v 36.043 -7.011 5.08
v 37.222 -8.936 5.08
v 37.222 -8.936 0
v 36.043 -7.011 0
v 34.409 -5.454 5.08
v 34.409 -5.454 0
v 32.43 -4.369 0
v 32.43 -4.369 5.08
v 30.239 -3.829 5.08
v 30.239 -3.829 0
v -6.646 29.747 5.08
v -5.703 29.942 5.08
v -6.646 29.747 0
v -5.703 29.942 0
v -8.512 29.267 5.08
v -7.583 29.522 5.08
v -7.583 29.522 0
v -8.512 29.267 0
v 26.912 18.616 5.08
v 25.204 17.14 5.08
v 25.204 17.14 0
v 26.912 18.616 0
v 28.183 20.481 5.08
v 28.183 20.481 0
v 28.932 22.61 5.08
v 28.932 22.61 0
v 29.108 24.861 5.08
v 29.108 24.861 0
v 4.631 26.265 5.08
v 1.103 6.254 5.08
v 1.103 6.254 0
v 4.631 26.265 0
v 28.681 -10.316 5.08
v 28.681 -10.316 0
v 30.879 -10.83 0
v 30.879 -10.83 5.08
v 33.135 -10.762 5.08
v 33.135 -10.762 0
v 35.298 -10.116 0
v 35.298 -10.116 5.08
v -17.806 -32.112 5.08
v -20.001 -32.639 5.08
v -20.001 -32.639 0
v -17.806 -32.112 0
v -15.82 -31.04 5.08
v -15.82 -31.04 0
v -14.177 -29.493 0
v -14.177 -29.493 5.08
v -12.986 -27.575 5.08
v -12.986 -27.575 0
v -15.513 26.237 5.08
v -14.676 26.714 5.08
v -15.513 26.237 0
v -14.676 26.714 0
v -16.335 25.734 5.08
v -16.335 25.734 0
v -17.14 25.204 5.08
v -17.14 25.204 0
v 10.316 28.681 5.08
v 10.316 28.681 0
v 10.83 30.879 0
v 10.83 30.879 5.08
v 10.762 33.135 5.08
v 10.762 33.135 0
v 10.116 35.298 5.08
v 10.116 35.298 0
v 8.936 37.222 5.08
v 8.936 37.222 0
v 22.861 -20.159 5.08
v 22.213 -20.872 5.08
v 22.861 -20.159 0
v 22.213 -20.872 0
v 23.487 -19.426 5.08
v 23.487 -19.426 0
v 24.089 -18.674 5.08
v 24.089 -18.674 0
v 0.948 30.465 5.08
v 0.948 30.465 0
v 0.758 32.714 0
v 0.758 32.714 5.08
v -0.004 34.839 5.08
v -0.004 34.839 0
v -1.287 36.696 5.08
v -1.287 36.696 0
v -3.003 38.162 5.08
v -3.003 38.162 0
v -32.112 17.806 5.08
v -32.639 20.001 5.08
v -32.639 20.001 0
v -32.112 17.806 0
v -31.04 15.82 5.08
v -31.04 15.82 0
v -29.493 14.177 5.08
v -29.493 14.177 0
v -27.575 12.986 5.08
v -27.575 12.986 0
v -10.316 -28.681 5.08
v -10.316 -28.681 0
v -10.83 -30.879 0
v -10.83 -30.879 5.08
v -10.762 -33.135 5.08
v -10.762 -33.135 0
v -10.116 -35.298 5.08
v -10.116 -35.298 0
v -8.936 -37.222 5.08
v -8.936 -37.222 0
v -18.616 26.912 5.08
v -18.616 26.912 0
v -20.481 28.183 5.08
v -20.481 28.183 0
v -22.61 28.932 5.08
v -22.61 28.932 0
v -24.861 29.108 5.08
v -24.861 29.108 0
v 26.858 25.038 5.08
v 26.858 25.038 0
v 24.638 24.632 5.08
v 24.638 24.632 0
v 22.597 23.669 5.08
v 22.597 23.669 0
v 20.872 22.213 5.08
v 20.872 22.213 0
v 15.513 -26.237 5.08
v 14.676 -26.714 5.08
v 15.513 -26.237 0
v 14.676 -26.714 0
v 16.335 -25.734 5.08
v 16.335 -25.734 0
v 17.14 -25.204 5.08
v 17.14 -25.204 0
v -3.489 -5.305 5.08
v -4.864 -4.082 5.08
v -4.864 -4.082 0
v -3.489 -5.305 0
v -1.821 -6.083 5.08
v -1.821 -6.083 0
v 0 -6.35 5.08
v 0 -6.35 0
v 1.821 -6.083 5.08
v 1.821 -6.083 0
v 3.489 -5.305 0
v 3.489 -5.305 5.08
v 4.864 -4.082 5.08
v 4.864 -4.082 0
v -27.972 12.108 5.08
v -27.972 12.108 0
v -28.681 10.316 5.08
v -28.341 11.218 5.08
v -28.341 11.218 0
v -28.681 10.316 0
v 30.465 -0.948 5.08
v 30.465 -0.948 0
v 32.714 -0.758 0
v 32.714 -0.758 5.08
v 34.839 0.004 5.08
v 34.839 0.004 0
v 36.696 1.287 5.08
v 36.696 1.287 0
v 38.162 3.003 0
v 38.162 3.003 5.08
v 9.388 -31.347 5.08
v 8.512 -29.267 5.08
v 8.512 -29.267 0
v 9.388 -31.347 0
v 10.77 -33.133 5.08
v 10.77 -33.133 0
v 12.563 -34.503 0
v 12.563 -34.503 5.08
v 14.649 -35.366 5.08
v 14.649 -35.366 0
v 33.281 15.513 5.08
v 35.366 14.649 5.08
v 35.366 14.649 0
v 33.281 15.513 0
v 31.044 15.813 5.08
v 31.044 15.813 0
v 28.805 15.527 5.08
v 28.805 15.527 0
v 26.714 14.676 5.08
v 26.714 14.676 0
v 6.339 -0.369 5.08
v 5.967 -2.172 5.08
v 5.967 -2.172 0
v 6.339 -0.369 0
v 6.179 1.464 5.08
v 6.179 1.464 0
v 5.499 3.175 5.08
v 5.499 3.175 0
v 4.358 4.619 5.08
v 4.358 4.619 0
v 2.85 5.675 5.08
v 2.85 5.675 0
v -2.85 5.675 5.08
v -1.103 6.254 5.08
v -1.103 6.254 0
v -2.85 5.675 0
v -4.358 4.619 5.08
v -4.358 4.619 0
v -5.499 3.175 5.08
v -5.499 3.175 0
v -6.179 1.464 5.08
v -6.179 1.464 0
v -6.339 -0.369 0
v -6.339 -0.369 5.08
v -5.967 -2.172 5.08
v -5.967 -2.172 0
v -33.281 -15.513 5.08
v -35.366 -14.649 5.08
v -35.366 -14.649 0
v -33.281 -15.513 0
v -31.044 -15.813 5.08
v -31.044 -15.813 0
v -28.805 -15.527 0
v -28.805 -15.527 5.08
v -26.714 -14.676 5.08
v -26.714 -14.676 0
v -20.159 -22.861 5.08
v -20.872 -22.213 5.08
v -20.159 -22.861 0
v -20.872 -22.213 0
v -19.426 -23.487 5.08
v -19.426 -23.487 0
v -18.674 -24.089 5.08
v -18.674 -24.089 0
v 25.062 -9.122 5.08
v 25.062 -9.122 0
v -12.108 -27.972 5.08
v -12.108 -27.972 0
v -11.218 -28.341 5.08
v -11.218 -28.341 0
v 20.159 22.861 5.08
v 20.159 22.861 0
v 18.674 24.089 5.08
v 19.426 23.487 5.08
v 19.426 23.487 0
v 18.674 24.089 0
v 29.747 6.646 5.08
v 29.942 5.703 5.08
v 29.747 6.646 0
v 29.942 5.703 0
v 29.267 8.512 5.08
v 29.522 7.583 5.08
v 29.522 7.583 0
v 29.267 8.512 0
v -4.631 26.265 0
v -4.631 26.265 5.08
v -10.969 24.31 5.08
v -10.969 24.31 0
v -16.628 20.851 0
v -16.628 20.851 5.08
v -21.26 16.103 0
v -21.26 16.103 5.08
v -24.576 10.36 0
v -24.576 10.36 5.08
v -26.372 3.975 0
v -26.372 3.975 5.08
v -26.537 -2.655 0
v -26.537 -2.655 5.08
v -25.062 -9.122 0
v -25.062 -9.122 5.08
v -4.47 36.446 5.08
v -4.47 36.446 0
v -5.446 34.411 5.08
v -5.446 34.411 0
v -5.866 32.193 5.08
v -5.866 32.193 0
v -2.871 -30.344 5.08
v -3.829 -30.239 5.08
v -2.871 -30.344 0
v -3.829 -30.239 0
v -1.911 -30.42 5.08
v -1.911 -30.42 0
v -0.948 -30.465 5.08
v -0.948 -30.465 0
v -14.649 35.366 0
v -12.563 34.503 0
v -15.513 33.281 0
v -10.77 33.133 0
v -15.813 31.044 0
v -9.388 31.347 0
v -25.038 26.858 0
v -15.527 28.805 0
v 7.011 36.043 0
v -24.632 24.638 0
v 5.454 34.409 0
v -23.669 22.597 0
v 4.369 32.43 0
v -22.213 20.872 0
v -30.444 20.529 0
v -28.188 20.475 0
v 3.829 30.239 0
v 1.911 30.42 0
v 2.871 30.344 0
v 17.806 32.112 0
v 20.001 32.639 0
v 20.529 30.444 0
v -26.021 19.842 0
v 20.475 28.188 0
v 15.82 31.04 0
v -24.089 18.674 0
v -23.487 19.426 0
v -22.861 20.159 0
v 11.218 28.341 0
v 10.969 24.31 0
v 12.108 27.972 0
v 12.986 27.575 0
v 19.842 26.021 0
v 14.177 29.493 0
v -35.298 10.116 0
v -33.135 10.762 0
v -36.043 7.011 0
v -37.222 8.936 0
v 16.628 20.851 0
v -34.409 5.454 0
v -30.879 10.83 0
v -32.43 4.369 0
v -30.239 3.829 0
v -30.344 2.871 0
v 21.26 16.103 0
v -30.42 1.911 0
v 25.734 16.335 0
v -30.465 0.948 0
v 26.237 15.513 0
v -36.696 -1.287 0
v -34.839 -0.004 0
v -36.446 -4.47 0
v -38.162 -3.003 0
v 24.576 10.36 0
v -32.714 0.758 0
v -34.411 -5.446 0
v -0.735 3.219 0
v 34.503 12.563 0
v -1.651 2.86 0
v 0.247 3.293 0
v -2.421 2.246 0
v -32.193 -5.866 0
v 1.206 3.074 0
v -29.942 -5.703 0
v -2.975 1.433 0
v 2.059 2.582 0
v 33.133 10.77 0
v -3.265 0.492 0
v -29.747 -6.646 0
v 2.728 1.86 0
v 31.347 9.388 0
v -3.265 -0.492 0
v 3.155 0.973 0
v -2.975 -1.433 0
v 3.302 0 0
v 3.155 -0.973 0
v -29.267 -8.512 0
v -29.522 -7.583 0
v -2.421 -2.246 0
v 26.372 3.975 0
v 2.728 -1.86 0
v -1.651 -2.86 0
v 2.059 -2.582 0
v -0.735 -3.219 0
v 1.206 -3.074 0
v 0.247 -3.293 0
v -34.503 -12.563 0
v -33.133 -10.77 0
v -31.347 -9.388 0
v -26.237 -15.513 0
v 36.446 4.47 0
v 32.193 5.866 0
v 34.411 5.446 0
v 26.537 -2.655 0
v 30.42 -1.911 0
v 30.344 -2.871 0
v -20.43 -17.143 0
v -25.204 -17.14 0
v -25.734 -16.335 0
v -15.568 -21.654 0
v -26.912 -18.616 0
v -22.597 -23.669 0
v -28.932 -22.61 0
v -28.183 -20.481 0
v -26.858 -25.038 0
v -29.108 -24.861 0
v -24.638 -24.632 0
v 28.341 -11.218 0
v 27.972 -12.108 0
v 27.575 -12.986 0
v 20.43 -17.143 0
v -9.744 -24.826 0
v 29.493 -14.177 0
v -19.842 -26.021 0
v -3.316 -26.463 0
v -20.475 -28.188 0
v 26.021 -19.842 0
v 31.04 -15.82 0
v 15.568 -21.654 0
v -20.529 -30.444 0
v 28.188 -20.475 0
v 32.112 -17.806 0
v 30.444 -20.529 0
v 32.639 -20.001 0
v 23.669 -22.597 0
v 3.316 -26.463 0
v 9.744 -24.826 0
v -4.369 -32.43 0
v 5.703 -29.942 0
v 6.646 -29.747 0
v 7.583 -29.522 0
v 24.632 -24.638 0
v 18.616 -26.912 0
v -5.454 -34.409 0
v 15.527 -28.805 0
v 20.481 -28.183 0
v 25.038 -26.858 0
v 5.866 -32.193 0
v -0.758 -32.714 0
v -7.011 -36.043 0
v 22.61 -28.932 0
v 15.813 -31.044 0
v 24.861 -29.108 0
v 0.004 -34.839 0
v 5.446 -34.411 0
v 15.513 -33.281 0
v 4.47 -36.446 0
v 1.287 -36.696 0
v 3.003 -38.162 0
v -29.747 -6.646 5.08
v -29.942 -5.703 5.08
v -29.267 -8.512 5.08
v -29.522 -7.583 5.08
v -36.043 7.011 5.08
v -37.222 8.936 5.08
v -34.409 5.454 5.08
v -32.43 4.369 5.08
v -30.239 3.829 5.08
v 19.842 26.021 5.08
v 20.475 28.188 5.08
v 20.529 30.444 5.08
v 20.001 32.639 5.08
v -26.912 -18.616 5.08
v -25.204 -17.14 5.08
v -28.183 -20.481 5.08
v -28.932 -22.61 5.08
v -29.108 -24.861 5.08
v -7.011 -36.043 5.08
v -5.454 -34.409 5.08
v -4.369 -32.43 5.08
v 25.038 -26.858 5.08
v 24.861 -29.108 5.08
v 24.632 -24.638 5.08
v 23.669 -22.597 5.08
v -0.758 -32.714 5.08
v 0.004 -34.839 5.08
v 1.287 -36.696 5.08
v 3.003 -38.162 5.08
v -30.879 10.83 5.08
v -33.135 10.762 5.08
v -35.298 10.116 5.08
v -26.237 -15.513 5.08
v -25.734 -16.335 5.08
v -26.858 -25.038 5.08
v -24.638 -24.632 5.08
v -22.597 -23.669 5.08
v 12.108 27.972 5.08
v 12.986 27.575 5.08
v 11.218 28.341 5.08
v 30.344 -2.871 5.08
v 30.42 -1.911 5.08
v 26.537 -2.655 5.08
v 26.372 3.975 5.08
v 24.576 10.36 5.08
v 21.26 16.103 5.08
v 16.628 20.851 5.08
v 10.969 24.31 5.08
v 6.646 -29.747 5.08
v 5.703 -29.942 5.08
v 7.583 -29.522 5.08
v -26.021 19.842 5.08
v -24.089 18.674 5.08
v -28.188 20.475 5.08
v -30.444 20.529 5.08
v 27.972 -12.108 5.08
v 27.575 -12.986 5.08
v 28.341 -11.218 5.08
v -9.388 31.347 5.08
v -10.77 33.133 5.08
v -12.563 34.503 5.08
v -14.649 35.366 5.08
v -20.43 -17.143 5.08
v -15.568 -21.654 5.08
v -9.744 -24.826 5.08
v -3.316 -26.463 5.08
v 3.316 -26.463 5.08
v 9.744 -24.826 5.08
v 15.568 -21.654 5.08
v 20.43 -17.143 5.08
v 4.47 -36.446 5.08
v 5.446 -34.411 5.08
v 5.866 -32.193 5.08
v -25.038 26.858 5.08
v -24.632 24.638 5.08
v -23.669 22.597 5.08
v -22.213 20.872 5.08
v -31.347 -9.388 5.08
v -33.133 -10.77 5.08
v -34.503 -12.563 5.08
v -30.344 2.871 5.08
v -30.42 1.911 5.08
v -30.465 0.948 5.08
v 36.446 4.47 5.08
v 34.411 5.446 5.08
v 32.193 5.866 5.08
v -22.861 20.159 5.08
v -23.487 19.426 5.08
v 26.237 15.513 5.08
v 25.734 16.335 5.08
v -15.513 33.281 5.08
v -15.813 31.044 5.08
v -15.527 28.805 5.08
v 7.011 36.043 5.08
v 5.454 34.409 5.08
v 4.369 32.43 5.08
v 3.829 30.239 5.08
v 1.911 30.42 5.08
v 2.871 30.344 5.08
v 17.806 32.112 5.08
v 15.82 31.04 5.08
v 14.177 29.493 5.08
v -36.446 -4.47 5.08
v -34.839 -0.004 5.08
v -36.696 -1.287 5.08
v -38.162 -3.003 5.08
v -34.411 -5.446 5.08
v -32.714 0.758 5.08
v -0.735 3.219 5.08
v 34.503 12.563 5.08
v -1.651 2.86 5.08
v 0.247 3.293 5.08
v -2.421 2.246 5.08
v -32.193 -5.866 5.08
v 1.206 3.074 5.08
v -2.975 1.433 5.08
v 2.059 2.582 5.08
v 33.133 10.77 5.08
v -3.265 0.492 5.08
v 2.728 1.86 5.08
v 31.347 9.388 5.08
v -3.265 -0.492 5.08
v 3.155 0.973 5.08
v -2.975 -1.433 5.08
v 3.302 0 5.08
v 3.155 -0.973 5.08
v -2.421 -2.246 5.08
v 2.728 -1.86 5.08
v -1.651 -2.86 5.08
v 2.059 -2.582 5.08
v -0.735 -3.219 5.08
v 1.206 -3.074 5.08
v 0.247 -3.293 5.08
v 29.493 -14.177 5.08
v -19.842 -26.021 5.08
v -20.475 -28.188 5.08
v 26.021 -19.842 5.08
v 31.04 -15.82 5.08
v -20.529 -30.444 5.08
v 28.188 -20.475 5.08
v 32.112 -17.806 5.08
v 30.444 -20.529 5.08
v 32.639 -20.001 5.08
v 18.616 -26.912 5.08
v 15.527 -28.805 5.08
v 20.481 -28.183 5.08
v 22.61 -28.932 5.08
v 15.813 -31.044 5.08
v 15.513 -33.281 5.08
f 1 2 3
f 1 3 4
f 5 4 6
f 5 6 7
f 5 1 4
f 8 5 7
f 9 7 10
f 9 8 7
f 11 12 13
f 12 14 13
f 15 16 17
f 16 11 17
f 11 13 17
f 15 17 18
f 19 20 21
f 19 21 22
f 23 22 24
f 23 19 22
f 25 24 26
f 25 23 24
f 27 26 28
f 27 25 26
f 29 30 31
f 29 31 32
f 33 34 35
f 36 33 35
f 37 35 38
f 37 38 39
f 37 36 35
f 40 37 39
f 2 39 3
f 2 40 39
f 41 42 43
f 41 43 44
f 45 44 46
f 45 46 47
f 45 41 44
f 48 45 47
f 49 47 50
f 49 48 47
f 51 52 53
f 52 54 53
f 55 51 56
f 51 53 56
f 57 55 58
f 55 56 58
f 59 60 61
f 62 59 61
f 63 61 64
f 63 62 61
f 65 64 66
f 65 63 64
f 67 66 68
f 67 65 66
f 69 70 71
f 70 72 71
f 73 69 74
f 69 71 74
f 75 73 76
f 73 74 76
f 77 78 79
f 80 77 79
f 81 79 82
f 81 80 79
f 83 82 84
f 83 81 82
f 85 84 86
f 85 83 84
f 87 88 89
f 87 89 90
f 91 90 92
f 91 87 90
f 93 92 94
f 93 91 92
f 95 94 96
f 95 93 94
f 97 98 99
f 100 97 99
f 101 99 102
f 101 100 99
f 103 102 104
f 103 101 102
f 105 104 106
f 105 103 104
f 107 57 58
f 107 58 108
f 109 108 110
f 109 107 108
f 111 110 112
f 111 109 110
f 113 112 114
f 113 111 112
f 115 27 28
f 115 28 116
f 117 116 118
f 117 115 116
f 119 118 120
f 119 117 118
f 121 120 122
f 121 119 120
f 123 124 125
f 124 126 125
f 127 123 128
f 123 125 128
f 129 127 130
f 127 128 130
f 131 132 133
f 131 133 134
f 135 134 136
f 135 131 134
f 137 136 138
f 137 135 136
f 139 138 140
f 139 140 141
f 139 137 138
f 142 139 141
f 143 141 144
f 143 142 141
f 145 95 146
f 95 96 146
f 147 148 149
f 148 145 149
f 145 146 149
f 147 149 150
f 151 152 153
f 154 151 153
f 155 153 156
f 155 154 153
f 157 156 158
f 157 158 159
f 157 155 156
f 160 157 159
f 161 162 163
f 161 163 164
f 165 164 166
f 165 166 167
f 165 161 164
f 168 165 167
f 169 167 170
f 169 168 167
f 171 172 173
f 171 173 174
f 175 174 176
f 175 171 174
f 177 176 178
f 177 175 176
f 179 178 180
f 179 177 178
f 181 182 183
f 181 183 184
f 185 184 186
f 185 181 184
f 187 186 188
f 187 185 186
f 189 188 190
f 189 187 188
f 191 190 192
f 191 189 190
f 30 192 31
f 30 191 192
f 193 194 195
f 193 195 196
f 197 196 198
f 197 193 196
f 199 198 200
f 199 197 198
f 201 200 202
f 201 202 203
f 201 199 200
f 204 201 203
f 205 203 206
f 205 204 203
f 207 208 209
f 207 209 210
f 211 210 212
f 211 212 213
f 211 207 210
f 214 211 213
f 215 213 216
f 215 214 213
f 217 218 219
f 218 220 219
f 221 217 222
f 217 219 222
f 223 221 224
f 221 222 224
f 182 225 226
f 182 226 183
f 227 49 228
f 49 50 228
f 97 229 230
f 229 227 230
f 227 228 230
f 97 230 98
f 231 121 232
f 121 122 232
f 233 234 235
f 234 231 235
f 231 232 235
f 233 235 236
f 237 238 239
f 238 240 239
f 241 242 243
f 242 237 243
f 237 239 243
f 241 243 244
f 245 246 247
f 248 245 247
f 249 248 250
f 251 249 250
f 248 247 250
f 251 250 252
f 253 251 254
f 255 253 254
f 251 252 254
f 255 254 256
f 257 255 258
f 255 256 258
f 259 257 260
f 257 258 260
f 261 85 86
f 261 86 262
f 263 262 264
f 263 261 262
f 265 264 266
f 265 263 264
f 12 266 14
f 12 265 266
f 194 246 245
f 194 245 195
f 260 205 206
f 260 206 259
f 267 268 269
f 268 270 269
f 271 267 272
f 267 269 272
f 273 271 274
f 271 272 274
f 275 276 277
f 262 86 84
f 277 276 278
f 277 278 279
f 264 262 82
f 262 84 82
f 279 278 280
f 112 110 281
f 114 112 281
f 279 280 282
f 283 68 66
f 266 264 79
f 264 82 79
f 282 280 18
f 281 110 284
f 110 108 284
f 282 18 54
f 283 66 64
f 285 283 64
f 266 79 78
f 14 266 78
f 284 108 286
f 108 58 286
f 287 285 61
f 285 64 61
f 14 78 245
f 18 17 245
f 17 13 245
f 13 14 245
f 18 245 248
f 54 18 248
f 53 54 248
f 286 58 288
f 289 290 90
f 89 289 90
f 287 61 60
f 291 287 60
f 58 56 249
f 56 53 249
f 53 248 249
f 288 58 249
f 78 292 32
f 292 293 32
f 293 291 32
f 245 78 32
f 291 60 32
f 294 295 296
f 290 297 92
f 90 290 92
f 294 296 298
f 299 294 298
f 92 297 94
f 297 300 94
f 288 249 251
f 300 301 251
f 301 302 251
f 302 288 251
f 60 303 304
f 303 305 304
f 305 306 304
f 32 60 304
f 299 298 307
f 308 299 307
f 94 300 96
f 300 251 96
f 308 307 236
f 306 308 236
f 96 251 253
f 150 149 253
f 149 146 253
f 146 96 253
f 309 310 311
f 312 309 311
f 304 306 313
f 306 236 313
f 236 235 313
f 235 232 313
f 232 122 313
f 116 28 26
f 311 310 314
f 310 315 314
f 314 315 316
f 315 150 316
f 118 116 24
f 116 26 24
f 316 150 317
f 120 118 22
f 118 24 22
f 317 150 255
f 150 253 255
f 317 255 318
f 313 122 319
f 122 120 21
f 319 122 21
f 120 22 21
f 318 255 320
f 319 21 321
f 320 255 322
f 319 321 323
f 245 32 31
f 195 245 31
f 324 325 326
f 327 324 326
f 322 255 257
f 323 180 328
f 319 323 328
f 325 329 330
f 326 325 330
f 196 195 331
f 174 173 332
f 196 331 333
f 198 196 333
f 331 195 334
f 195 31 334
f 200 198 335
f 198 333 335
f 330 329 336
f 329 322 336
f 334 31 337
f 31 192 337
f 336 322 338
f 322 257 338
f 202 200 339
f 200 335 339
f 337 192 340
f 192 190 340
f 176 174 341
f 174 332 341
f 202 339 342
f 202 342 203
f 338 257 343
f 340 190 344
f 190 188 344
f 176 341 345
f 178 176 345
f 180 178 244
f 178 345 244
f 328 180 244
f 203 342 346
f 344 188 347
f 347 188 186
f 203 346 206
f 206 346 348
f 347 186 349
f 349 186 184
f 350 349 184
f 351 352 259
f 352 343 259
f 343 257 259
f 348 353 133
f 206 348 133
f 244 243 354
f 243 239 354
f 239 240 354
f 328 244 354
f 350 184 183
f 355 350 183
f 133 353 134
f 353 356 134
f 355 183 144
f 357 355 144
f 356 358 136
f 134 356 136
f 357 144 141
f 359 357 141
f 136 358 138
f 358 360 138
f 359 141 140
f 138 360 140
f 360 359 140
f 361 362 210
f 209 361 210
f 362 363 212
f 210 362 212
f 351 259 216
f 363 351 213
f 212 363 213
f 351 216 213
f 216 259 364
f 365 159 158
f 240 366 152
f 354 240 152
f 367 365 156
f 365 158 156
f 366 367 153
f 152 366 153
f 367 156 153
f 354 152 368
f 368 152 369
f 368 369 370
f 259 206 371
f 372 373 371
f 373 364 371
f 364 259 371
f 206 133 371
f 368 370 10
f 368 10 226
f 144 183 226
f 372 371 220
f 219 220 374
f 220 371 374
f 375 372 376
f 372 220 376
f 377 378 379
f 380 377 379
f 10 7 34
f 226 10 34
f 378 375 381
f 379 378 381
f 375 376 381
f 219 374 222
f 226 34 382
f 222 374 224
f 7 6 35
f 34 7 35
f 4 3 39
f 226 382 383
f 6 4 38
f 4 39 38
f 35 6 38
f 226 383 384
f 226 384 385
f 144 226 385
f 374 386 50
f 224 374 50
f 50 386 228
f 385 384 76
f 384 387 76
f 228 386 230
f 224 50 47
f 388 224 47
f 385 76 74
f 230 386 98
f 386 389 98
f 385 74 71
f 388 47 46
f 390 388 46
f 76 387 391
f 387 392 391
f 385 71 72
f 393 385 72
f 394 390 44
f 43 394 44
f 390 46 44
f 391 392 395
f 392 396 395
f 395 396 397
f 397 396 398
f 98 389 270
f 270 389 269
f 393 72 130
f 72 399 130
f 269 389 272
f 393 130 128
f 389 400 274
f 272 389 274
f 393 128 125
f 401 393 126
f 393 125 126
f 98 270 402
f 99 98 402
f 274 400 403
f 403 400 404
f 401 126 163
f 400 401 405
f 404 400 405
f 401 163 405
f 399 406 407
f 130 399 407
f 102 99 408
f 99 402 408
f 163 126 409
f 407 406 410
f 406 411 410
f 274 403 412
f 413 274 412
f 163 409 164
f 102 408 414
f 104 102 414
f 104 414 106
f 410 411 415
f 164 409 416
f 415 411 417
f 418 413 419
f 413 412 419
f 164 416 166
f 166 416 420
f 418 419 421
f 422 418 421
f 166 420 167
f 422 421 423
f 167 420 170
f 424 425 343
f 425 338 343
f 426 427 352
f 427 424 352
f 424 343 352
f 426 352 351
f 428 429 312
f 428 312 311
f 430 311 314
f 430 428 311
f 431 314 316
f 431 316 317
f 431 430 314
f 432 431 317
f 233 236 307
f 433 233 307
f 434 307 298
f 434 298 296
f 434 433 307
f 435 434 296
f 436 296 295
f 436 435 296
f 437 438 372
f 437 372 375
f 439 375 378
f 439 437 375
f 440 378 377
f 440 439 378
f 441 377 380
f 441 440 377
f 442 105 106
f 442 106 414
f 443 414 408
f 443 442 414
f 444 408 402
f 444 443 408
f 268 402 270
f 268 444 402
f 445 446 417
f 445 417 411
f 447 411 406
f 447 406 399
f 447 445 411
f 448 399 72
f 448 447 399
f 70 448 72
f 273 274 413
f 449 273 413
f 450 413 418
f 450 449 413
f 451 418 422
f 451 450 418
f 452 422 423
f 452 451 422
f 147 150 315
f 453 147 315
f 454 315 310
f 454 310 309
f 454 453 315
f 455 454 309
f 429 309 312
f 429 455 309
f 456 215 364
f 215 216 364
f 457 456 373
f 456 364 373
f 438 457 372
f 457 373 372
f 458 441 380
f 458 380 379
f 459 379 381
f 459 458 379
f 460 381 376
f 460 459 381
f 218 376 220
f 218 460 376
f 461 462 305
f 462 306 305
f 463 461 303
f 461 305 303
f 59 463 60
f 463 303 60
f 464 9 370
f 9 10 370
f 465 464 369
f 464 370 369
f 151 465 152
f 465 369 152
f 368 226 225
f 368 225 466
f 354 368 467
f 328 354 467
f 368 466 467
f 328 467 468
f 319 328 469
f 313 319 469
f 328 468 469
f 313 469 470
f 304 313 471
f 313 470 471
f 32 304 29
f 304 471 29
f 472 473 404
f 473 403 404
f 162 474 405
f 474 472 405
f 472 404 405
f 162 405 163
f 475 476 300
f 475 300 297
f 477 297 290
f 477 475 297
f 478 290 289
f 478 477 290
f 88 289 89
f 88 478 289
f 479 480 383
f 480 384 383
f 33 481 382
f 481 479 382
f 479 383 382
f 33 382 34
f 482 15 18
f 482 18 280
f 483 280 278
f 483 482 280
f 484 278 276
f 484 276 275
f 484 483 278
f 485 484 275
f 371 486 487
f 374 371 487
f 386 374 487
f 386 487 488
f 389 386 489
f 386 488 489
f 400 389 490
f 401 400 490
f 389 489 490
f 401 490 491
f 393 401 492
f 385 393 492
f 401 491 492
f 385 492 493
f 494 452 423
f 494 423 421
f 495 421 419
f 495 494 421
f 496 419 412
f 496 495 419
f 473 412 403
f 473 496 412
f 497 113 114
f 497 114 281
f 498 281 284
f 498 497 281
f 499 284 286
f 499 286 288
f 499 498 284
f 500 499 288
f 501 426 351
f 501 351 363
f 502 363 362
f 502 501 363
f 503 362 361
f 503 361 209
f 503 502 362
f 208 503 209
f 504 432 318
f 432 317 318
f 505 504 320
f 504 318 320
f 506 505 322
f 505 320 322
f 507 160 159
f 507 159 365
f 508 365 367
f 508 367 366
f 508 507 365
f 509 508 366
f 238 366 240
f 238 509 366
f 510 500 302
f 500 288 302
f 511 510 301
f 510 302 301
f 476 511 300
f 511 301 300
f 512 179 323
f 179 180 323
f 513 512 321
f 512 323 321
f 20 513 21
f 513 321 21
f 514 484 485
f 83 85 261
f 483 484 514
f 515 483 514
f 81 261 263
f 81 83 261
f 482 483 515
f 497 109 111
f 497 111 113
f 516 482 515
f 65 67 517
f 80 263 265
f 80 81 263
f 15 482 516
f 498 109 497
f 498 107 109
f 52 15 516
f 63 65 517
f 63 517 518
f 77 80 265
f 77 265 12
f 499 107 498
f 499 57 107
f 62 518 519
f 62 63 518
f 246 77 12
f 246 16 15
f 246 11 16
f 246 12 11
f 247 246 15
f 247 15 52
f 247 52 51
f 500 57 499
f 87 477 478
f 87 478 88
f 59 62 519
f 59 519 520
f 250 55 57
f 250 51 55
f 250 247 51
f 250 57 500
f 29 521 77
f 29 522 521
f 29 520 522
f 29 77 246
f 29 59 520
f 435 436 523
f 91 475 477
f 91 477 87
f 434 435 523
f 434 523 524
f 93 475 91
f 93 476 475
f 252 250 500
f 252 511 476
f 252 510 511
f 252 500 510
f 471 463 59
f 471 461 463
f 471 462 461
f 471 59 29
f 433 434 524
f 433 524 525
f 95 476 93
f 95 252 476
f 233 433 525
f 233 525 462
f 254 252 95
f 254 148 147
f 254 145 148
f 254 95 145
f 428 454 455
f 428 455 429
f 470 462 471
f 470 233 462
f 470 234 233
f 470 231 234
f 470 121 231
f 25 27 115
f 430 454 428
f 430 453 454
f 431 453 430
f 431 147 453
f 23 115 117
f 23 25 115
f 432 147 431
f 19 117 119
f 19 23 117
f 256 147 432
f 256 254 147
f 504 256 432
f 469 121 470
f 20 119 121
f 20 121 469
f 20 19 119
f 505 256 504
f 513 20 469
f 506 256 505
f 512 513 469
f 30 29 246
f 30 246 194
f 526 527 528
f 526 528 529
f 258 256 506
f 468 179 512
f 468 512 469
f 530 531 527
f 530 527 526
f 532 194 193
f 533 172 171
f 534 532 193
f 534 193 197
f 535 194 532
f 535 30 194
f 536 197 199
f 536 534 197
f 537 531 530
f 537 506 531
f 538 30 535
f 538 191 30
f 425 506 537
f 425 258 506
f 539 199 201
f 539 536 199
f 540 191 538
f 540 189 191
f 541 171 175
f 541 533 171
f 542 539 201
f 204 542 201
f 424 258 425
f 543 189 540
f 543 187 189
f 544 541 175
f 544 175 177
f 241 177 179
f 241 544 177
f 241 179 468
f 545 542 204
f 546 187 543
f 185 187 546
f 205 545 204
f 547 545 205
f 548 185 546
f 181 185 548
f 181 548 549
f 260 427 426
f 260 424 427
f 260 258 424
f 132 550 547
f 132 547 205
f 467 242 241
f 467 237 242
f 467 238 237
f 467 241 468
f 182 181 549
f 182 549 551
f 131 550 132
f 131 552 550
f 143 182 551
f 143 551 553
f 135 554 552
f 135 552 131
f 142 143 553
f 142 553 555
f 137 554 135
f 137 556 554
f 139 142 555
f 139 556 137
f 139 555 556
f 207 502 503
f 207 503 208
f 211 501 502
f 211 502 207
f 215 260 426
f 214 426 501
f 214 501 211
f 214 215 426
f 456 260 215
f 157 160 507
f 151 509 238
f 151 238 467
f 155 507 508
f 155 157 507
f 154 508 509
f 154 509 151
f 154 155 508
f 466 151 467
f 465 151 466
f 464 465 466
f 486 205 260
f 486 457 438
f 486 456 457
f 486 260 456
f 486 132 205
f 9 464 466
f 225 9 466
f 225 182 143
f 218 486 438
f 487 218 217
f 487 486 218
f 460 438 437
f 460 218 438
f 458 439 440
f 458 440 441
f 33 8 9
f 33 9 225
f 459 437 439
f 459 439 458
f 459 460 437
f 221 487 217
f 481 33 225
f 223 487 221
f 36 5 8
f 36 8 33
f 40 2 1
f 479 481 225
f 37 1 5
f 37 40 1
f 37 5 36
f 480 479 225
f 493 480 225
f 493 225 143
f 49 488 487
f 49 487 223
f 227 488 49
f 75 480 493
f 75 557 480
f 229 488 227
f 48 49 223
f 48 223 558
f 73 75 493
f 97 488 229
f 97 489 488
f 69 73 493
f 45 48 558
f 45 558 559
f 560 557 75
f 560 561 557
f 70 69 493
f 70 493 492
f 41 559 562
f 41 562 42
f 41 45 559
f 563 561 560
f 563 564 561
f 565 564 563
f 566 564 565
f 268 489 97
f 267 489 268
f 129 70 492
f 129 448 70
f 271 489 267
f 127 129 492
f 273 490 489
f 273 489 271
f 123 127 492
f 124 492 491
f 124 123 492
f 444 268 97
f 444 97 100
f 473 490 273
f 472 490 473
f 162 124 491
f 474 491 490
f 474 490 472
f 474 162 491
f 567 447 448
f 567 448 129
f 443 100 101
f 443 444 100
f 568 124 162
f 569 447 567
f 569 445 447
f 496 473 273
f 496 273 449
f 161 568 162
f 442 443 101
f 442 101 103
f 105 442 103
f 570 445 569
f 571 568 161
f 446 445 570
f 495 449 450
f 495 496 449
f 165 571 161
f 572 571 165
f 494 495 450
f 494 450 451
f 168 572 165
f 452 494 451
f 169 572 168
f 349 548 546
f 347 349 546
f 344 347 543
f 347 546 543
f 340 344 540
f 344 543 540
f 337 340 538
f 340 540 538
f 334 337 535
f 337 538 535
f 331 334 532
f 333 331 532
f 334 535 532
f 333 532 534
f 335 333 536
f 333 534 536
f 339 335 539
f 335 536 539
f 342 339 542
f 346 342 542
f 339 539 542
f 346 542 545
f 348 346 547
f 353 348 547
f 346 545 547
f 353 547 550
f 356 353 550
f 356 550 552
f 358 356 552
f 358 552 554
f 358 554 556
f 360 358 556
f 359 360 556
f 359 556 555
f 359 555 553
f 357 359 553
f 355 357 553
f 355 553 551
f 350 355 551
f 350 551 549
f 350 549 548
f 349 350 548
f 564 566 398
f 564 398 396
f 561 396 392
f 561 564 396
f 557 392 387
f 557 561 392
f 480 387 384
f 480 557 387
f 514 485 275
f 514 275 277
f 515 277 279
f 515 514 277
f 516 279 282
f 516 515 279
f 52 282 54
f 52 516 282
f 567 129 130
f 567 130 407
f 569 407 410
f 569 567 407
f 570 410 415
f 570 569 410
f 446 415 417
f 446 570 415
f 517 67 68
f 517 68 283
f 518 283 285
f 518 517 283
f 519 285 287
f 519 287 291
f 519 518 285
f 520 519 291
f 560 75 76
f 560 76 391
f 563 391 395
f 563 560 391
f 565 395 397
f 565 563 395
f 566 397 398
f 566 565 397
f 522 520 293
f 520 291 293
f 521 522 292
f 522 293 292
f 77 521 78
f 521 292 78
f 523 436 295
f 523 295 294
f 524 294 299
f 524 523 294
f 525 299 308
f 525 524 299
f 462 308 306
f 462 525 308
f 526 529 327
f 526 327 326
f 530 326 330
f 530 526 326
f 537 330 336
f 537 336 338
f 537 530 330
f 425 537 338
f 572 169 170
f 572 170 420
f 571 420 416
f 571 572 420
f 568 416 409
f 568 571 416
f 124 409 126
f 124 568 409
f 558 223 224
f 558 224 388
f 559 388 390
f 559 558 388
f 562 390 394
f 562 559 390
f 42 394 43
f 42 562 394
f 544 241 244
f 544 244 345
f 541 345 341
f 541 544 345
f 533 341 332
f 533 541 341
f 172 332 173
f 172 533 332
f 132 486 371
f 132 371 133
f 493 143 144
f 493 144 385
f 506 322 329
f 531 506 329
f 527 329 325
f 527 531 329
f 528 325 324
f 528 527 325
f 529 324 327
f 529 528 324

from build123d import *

# Parameters (mm, degrees)
F0_R      = 30.48
F1_DEPTH  = 5.08
F3_DEPTH  = 5.08
F4_COUNT  = 20
F5_R      = 26.67
F6_DEPTH  = 5.081
F7_DEPTH  = 5.081
F9_DEPTH  = 5.08
F10_COUNT = 3
F11_R     = 3.302
F12_DEPTH = 5.081


with BuildPart() as f1:
    # F0 (on Top) → F1 (new body)
    with BuildSketch(Plane.XY):
        Circle(F0_R)
    extrude(amount=F1_DEPTH)

    # F4: F3 ×20 about axis
    f4_axis = Axis((0, 0, 5.08), (0, 0, 1))


with BuildPart() as f3:
    # F2 (on face) → F3 (new body, through all)
    with BuildSketch(Plane.XY.offset(5.08)):
        with BuildLine():
            Line((-5.7019906833, 29.9389965966), (0.9482987996, 30.4623857298))
            ThreePointArc((0.9482987996, 30.4623857298), (-0.0033837458, 34.8376195512), (-3.0033778465, 38.1615338182))
            ThreePointArc((-3.0033778465, 38.1615338182), (-5.4464622915, 34.4092399792), (-5.7019906833, 29.9389965966))
        make_face()
    extrude(amount=-F3_DEPTH)


with BuildPart() as f1_1:
    add(f1.part)
    for i in range(1, F4_COUNT):
        add(f3.part.rotate(f4_axis, i * 360 / F4_COUNT))

    # F5 (on face) → F6 (cut, through all)
    with BuildSketch(Plane.XY.offset(5.08)):
        Circle(F5_R)
    extrude(amount=-F6_DEPTH, mode=Mode.SUBTRACT)

    # F5 (on face) → F7 (cut, through all)
    with BuildSketch(Plane.XY.offset(5.08)):
        Circle(F5_R)
    extrude(amount=-F7_DEPTH, mode=Mode.SUBTRACT)



with BuildPart() as f9:
    # F8 (on face) → F9 (new body, through all)
    with BuildSketch(Plane.XY.offset(5.08)):
        with BuildLine():
            Line((-4.6311968984, 26.2648227728), (-1.1026659282, 6.2535292316))
            ThreePointArc((-1.1026659282, 6.2535292316), (0, -6.35), (1.1026659282, 6.2535292316))
            Line((1.1026659282, 6.2535292316), (4.6311968984, 26.2648227728))
            ThreePointArc((4.6311968984, 26.2648227728), (0, 26.67), (-4.6311968984, 26.2648227728))
        make_face()
    extrude(amount=-F9_DEPTH)


with BuildPart() as f1_2:
    add(f1_1.part)

    add(f3.part)  # F10 merges F3

    add(f9.part)  # F10 merges F9
    # F10: F9 ×3 about axis
    f10_axis = Axis((0, 0, 5.08), (0, 0, 1))
    for i in range(1, F10_COUNT):
        add(f9.part.rotate(f10_axis, i * 360 / F10_COUNT))

    # F11 (on face) → F12 (cut, through all)
    with BuildSketch(Plane.XY.offset(5.08)):
        Circle(F11_R)
    extrude(amount=-F12_DEPTH, mode=Mode.SUBTRACT)


solid = f1_2.part
